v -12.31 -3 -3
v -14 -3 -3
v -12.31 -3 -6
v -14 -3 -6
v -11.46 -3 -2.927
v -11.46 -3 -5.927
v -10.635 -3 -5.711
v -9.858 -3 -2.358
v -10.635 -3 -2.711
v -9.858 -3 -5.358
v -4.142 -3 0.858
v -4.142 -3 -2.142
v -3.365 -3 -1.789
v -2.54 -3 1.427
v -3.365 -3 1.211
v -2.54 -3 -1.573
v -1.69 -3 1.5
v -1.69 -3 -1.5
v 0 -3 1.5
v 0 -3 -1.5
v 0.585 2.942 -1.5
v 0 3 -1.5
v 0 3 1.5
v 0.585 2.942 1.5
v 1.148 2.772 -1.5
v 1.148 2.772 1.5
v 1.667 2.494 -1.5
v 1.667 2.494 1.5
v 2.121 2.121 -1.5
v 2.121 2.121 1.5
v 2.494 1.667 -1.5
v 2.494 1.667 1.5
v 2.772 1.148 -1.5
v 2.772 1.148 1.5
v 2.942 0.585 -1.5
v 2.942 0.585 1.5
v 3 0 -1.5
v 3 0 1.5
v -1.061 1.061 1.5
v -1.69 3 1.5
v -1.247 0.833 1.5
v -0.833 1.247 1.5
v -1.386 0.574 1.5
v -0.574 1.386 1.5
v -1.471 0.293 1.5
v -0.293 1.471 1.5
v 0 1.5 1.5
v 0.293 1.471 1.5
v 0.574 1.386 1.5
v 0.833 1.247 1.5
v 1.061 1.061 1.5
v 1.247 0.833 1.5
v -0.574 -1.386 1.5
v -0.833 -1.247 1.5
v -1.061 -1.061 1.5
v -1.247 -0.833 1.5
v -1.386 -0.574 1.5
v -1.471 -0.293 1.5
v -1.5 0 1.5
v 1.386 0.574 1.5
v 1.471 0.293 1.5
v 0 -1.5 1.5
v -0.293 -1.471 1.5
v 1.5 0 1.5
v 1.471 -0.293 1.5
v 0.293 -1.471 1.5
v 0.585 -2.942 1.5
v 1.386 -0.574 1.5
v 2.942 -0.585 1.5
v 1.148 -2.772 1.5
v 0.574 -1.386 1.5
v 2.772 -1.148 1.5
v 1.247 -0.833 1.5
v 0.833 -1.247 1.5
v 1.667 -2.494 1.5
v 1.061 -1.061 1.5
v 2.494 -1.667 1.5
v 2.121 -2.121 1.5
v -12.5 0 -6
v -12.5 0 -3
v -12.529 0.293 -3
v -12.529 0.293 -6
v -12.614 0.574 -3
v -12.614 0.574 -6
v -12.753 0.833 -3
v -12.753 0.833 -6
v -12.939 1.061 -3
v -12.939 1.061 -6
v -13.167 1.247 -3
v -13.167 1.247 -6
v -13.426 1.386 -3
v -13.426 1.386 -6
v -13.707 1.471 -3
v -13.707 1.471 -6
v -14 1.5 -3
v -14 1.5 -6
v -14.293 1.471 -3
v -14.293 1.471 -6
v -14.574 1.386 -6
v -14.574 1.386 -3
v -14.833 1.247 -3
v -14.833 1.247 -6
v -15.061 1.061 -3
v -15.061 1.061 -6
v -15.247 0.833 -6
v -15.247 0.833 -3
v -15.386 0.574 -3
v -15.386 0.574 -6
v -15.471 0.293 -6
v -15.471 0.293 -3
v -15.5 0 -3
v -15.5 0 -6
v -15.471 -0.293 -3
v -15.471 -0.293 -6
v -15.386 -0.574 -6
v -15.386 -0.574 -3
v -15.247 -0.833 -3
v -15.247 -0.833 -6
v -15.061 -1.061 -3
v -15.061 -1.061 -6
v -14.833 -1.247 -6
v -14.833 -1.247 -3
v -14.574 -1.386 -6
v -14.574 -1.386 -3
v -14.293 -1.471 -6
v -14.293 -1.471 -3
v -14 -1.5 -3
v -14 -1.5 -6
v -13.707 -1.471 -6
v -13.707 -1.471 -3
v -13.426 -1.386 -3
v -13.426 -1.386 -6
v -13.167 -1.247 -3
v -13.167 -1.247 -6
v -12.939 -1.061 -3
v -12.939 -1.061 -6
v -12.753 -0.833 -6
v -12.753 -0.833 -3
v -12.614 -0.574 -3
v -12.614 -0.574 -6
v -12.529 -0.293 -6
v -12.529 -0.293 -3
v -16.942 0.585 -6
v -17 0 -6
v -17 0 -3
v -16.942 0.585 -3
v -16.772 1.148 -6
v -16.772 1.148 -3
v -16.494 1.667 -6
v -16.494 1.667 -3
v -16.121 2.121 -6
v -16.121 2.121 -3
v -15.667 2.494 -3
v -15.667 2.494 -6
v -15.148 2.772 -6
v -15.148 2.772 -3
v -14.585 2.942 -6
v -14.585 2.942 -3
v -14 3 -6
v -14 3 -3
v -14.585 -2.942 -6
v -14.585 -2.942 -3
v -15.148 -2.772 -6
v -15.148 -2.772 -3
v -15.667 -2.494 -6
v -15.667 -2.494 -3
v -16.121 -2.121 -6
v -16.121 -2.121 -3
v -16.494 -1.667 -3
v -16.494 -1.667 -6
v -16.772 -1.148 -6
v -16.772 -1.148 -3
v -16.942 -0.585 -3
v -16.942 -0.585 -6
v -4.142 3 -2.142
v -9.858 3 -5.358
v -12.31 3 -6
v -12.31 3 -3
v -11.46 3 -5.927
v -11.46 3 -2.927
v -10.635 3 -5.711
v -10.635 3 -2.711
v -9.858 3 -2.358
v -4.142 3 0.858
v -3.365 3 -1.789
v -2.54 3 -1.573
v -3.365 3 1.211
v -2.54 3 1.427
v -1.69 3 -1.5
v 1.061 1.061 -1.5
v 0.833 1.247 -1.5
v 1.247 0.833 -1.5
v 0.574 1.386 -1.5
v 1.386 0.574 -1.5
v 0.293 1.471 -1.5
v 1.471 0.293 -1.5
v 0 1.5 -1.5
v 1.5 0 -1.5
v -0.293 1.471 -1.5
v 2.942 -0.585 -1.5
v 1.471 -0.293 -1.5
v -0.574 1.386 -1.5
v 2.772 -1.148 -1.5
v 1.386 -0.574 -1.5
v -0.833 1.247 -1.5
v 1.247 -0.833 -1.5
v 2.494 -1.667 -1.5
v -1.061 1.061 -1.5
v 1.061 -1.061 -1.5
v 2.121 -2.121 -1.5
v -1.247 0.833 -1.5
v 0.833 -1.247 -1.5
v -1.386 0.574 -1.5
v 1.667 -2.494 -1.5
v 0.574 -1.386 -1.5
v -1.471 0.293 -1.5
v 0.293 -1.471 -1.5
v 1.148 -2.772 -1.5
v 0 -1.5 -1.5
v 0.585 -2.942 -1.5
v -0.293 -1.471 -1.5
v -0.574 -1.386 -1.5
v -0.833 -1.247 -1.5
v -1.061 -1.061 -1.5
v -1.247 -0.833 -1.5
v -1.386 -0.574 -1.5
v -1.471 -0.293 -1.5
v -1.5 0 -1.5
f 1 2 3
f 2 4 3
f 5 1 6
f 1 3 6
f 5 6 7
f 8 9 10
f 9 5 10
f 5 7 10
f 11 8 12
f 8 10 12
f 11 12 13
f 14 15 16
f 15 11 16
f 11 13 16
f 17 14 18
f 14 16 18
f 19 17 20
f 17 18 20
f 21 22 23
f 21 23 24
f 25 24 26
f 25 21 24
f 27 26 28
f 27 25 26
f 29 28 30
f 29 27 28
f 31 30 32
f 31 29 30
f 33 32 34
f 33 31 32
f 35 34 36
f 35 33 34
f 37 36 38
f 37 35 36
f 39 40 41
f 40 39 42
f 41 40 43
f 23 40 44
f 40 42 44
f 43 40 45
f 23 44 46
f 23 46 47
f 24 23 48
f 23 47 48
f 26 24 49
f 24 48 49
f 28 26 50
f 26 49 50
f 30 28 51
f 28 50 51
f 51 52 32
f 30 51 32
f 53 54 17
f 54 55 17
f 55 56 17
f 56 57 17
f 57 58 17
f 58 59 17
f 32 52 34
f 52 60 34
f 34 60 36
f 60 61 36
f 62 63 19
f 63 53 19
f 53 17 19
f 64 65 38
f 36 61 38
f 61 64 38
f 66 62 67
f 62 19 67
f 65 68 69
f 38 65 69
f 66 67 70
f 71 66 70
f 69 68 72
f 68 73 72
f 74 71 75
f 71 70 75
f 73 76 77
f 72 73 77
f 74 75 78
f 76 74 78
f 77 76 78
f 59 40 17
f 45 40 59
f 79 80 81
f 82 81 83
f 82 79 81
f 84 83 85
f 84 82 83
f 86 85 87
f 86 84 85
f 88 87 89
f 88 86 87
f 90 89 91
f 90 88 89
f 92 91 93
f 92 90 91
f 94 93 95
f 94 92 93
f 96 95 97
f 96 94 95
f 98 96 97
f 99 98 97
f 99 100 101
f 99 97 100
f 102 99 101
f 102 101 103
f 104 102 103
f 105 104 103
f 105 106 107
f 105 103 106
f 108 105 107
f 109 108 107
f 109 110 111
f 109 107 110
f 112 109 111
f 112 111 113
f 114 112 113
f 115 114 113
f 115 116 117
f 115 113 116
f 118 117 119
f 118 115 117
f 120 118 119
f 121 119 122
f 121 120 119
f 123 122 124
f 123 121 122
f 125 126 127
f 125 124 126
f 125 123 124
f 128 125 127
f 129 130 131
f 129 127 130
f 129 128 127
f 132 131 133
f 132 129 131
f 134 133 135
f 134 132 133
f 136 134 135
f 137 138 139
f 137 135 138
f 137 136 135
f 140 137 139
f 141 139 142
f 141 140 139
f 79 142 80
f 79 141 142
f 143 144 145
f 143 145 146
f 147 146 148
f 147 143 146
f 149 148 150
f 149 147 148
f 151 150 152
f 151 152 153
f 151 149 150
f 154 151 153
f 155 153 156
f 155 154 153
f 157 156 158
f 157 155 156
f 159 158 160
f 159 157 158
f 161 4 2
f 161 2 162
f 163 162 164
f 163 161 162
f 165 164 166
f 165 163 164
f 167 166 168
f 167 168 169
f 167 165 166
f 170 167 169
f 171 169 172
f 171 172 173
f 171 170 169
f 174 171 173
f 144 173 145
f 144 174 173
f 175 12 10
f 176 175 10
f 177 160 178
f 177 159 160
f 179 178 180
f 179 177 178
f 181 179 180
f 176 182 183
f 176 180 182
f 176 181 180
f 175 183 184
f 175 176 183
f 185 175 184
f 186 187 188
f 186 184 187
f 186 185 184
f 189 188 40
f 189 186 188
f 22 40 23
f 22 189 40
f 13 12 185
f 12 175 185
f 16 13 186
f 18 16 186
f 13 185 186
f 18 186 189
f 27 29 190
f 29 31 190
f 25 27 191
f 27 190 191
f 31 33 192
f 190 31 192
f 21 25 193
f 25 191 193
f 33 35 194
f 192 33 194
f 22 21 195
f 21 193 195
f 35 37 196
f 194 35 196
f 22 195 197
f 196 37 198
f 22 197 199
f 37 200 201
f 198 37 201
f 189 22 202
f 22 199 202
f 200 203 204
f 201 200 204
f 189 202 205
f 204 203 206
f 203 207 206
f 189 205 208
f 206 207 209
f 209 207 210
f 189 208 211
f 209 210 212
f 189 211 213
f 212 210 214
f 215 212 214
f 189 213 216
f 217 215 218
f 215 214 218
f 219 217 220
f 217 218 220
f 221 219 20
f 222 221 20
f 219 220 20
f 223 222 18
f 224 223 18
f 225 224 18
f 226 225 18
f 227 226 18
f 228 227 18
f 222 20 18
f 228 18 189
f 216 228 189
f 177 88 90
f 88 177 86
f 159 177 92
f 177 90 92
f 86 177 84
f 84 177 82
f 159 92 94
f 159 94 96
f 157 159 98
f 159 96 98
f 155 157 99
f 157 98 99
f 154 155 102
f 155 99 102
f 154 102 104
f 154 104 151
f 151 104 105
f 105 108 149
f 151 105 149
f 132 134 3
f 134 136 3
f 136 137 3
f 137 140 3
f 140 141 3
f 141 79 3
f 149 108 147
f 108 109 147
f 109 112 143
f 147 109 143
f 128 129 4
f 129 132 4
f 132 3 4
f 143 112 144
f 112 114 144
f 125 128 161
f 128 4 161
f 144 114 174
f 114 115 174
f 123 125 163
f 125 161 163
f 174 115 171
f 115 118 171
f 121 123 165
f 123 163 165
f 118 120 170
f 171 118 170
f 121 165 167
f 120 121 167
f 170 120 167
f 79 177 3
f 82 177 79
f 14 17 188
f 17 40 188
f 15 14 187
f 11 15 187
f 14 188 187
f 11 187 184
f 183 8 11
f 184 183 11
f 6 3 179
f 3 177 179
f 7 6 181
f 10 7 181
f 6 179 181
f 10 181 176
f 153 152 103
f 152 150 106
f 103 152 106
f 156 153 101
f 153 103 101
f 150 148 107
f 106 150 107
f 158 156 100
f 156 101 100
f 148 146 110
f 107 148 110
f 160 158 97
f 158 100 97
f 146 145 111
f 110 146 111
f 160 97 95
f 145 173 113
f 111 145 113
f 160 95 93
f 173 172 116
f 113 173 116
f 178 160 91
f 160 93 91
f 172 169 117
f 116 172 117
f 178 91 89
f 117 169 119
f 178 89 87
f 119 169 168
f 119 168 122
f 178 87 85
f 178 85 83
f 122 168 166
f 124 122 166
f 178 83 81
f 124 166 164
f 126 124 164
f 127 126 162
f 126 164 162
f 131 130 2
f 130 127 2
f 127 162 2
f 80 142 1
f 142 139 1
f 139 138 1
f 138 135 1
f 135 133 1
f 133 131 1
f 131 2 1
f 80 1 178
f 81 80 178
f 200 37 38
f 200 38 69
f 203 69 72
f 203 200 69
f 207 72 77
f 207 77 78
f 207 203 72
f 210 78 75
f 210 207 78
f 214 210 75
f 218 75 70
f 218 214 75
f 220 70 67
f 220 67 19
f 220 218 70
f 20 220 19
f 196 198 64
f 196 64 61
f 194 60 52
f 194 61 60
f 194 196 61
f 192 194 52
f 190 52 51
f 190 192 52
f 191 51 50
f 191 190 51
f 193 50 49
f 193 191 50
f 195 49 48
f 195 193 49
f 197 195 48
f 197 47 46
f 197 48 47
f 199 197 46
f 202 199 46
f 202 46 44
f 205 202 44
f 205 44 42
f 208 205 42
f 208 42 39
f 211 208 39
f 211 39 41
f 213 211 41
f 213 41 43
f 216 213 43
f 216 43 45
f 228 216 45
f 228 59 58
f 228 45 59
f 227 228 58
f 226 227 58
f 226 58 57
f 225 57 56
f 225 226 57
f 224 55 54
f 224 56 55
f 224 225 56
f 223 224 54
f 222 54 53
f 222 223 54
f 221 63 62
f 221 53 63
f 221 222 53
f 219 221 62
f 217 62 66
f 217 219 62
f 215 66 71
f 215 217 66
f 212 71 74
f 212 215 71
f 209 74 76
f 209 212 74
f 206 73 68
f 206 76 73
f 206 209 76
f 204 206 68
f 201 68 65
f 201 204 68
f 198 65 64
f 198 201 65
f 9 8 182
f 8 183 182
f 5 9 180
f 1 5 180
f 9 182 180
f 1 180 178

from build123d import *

# Parameters (mm, degrees)
BOSS_EXTRUDE1_DEPTH      = 3
BOSS_EXTRUDE1_DEPTH_BACK = 3
CUT_EXTRUDE1_DEPTH       = 3
CUT_EXTRUDE1_DEPTH_BACK  = 3
SKETCH2_R                = 1.5
CUT_EXTRUDE3_DEPTH       = 3
CUT_EXTRUDE3_DEPTH_BACK  = 3
SKETCH4_R                = 1.5
FILLET1_R                = 5


with BuildPart() as part:
    # Sketch3 → Boss-Extrude1 (new, two sides: drawn at the far end of the back side and taken through both)
    with BuildSketch(Plane(origin=(0, 0, 0), x_dir=(1, 0, 0), z_dir=(0, 1, 0)).offset(-BOSS_EXTRUDE1_DEPTH_BACK)):
        Polygon((-3, -1.5), (3, -1.5), (3, 1.5), (-3, 1.5), (-11, 6), (-17, 6), (-17, 3), (-11, 3), align=None)
    extrude(amount=BOSS_EXTRUDE1_DEPTH + BOSS_EXTRUDE1_DEPTH_BACK)

    # Sketch2 → Cut-Extrude1 (cut, two sides: drawn at the far end of the back side and taken through both)
    with BuildSketch(Plane.XY.offset(-CUT_EXTRUDE1_DEPTH_BACK)):
        with BuildLine():
            ThreePointArc((0, 3), (2.121320344, 2.121320344), (3, 0))
            Line((3, 0), (3, 3))
            Line((3, 3), (0, 3))
        make_face()
        with BuildLine():
            ThreePointArc((3, 0), (2.121320338, -2.121320349), (-1.5e-08, -3))
            Line((-1.5e-08, -3), (3, -3))
            Line((3, -3), (3, 0))
        make_face()
        Circle(SKETCH2_R)
    extrude(amount=CUT_EXTRUDE1_DEPTH + CUT_EXTRUDE1_DEPTH_BACK, mode=Mode.SUBTRACT)

    # Sketch4 → Cut-Extrude3 (cut, two sides: drawn at the far end of the back side and taken through both)
    with BuildSketch(Plane.XY.offset(-3).offset(-CUT_EXTRUDE3_DEPTH_BACK)):
        with BuildLine():
            ThreePointArc((-14, -3), (-16.121320333, -2.121320355), (-17, -3.1e-08))
            Line((-17, -3.1e-08), (-17, -3))
            Line((-17, -3), (-14, -3))
        make_face()
        with BuildLine():
            ThreePointArc((-17, -3.1e-08), (-16.121320355, 2.121320333), (-14, 3))
            Line((-14, 3), (-17, 3))
            Line((-17, 3), (-17, -3.1e-08))
        make_face()
        with Locations((-14, 0)):
            Circle(SKETCH4_R)
    extrude(amount=CUT_EXTRUDE3_DEPTH + CUT_EXTRUDE3_DEPTH_BACK, mode=Mode.SUBTRACT)

    # Fillet1
    fillet1_edges = [part.edges().sort_by_distance(p)[0] for p in [
        (-3, 0, -1.5),
        (-3, 0, 1.5),
        (-11, 0, -3),
        (-11, 0, -6),
    ]]
    fillet(fillet1_edges, radius=FILLET1_R)


solid = part.part
